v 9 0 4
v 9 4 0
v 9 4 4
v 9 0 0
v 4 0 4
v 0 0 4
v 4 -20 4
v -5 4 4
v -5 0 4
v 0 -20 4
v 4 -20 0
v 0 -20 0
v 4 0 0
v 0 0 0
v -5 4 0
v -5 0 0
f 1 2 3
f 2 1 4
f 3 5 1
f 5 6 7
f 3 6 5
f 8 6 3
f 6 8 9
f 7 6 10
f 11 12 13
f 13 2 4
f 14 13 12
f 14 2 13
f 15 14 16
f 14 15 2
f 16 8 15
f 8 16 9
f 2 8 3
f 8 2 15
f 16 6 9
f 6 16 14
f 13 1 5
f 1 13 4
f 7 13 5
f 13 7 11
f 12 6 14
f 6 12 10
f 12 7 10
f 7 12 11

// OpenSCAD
//male or female part
partType="Both";//[Male,Female,Both]

//This is the max width of the tongue
width=4;

//This is the length of the tongue
length=4;

//This is the height of the block that the tongue is attached to
height=4;

//This is the height from the bottom of the block to the bottom of the tongue
height_2=1;

//this is the height of the end of the tongue (Height - Height_2 > height_3 > 0
height_3=1;

//angle of tongue
angle =30;

//Additional width of male block, amount wider than tongue
Male_Block_Width = 0;

//Additional width of female block, amount wider than tongue
Female_Block_Width = 10;

//Length of block the tongue is attached to
Male_Block_Length = 20;

//Depth of Block (>=0) 
Block_Depth = 0;

//Tolerance Gap to ensure a good fit (0.2 a good starting point assuming exporting using mm)
Tolerance=0.2;


if(partType=="Male"){

color([1,0,0])    
polyhedron(
  points=[ [width-((height-height_2)*tan(angle)),0,height],[width,0,height_2],[0,0,height_2],[(height-height_2)*tan(angle),0,height],[width-(height_3)*tan(angle),length,height],[width,length,(height-height_3)],[0,length,height-height_3],[(height_3)*tan(angle),length,height] ],          
  faces=[ [0,1,2],[0,2,3],//base face
          [0,4,1],[1,4,5], //side 1
          [0,3,4],[3,7,4], //top
          [2,7,3],[2,6,7], //side 2
          [1,5,2],[2,5,6], //bottom
          [6,5,4],[4,7,6]]  //end
);
color([1,0,0])        
translate([-Male_Block_Width/2,-Male_Block_Length,0]){cube([width+Male_Block_Width, Male_Block_Length, height]);}}


if (partType=="Female"){
    
    difference(){
          translate([-(Female_Block_Width)/2,0,0]){cube([width+Female_Block_Width, length+Block_Depth,      height]);}

          polyhedron(
               points=[ [width-((height-height_2)*tan(angle)),0,height],[width,0,height_2           ],[0,0,height_2],[(height-height_2)*tan(angle),0,height],[width-(height_3)*           tan(angle),length,height],[width,length,(height-height_3)],[0,length,height           -height_3],[(height_3)*tan(angle),length,height] ],          
               faces=[ [0,1,2],[0,2,3],//base face
                       [0,4,1],[1,4,5], //side 1
                       [0,3,4],[3,7,4], //top
                       [2,7,3],[2,6,7], //side 2
                       [1,5,2],[2,5,6], //bottom
                       [6,5,4],[4,7,6]],  //end
               convexity=10);
    
     }
 }
   
if(partType=="Both") { 
    color([1,0,0])
    polyhedron(
  points=[ [width-((height-height_2)*tan(angle)),0,height],[width,0,height_2],[0,0,height_2],[(height-height_2)*tan(angle),0,height],[width-(height_3)*tan(angle),length,height],[width,length,(height-height_3)],[0,length,height-height_3],[(height_3)*tan(angle),length,height] ],          
  faces=[ [0,1,2],[0,2,3],//base face
          [0,4,1],[1,4,5], //side 1
          [0,3,4],[3,7,4], //top
          [2,7,3],[2,6,7], //side 2
          [1,5,2],[2,5,6], //bottom
          [6,5,4],[4,7,6]]  //end
);
    color([1,0,0])    
translate([-Male_Block_Width/2,-Male_Block_Length,0]){cube([width+Male_Block_Width, Male_Block_Length, height]);}

    difference(){
          translate([-(Female_Block_Width)/2,0,0]){cube([width+Female_Block_Width, length+Block_Depth,      height]);}

          polyhedron(
               points=[ [width-((height-height_2)*tan(angle)),0,height],[width,0,height_2           ],[0,0,height_2],[(height-height_2)*tan(angle),0,height],[width-(height_3)*           tan(angle),length,height],[width,length,(height-height_3)],[0,length,height           -height_3],[(height_3)*tan(angle),length,height] ],          
               faces=[ [0,1,2],[0,2,3],//base face
                       [0,4,1],[1,4,5], //side 1
                       [0,3,4],[3,7,4], //top
                       [2,7,3],[2,6,7], //side 2
                       [1,5,2],[2,5,6], //bottom
                       [6,5,4],[4,7,6]],  //end
               convexity=10);
    
     }
 }
